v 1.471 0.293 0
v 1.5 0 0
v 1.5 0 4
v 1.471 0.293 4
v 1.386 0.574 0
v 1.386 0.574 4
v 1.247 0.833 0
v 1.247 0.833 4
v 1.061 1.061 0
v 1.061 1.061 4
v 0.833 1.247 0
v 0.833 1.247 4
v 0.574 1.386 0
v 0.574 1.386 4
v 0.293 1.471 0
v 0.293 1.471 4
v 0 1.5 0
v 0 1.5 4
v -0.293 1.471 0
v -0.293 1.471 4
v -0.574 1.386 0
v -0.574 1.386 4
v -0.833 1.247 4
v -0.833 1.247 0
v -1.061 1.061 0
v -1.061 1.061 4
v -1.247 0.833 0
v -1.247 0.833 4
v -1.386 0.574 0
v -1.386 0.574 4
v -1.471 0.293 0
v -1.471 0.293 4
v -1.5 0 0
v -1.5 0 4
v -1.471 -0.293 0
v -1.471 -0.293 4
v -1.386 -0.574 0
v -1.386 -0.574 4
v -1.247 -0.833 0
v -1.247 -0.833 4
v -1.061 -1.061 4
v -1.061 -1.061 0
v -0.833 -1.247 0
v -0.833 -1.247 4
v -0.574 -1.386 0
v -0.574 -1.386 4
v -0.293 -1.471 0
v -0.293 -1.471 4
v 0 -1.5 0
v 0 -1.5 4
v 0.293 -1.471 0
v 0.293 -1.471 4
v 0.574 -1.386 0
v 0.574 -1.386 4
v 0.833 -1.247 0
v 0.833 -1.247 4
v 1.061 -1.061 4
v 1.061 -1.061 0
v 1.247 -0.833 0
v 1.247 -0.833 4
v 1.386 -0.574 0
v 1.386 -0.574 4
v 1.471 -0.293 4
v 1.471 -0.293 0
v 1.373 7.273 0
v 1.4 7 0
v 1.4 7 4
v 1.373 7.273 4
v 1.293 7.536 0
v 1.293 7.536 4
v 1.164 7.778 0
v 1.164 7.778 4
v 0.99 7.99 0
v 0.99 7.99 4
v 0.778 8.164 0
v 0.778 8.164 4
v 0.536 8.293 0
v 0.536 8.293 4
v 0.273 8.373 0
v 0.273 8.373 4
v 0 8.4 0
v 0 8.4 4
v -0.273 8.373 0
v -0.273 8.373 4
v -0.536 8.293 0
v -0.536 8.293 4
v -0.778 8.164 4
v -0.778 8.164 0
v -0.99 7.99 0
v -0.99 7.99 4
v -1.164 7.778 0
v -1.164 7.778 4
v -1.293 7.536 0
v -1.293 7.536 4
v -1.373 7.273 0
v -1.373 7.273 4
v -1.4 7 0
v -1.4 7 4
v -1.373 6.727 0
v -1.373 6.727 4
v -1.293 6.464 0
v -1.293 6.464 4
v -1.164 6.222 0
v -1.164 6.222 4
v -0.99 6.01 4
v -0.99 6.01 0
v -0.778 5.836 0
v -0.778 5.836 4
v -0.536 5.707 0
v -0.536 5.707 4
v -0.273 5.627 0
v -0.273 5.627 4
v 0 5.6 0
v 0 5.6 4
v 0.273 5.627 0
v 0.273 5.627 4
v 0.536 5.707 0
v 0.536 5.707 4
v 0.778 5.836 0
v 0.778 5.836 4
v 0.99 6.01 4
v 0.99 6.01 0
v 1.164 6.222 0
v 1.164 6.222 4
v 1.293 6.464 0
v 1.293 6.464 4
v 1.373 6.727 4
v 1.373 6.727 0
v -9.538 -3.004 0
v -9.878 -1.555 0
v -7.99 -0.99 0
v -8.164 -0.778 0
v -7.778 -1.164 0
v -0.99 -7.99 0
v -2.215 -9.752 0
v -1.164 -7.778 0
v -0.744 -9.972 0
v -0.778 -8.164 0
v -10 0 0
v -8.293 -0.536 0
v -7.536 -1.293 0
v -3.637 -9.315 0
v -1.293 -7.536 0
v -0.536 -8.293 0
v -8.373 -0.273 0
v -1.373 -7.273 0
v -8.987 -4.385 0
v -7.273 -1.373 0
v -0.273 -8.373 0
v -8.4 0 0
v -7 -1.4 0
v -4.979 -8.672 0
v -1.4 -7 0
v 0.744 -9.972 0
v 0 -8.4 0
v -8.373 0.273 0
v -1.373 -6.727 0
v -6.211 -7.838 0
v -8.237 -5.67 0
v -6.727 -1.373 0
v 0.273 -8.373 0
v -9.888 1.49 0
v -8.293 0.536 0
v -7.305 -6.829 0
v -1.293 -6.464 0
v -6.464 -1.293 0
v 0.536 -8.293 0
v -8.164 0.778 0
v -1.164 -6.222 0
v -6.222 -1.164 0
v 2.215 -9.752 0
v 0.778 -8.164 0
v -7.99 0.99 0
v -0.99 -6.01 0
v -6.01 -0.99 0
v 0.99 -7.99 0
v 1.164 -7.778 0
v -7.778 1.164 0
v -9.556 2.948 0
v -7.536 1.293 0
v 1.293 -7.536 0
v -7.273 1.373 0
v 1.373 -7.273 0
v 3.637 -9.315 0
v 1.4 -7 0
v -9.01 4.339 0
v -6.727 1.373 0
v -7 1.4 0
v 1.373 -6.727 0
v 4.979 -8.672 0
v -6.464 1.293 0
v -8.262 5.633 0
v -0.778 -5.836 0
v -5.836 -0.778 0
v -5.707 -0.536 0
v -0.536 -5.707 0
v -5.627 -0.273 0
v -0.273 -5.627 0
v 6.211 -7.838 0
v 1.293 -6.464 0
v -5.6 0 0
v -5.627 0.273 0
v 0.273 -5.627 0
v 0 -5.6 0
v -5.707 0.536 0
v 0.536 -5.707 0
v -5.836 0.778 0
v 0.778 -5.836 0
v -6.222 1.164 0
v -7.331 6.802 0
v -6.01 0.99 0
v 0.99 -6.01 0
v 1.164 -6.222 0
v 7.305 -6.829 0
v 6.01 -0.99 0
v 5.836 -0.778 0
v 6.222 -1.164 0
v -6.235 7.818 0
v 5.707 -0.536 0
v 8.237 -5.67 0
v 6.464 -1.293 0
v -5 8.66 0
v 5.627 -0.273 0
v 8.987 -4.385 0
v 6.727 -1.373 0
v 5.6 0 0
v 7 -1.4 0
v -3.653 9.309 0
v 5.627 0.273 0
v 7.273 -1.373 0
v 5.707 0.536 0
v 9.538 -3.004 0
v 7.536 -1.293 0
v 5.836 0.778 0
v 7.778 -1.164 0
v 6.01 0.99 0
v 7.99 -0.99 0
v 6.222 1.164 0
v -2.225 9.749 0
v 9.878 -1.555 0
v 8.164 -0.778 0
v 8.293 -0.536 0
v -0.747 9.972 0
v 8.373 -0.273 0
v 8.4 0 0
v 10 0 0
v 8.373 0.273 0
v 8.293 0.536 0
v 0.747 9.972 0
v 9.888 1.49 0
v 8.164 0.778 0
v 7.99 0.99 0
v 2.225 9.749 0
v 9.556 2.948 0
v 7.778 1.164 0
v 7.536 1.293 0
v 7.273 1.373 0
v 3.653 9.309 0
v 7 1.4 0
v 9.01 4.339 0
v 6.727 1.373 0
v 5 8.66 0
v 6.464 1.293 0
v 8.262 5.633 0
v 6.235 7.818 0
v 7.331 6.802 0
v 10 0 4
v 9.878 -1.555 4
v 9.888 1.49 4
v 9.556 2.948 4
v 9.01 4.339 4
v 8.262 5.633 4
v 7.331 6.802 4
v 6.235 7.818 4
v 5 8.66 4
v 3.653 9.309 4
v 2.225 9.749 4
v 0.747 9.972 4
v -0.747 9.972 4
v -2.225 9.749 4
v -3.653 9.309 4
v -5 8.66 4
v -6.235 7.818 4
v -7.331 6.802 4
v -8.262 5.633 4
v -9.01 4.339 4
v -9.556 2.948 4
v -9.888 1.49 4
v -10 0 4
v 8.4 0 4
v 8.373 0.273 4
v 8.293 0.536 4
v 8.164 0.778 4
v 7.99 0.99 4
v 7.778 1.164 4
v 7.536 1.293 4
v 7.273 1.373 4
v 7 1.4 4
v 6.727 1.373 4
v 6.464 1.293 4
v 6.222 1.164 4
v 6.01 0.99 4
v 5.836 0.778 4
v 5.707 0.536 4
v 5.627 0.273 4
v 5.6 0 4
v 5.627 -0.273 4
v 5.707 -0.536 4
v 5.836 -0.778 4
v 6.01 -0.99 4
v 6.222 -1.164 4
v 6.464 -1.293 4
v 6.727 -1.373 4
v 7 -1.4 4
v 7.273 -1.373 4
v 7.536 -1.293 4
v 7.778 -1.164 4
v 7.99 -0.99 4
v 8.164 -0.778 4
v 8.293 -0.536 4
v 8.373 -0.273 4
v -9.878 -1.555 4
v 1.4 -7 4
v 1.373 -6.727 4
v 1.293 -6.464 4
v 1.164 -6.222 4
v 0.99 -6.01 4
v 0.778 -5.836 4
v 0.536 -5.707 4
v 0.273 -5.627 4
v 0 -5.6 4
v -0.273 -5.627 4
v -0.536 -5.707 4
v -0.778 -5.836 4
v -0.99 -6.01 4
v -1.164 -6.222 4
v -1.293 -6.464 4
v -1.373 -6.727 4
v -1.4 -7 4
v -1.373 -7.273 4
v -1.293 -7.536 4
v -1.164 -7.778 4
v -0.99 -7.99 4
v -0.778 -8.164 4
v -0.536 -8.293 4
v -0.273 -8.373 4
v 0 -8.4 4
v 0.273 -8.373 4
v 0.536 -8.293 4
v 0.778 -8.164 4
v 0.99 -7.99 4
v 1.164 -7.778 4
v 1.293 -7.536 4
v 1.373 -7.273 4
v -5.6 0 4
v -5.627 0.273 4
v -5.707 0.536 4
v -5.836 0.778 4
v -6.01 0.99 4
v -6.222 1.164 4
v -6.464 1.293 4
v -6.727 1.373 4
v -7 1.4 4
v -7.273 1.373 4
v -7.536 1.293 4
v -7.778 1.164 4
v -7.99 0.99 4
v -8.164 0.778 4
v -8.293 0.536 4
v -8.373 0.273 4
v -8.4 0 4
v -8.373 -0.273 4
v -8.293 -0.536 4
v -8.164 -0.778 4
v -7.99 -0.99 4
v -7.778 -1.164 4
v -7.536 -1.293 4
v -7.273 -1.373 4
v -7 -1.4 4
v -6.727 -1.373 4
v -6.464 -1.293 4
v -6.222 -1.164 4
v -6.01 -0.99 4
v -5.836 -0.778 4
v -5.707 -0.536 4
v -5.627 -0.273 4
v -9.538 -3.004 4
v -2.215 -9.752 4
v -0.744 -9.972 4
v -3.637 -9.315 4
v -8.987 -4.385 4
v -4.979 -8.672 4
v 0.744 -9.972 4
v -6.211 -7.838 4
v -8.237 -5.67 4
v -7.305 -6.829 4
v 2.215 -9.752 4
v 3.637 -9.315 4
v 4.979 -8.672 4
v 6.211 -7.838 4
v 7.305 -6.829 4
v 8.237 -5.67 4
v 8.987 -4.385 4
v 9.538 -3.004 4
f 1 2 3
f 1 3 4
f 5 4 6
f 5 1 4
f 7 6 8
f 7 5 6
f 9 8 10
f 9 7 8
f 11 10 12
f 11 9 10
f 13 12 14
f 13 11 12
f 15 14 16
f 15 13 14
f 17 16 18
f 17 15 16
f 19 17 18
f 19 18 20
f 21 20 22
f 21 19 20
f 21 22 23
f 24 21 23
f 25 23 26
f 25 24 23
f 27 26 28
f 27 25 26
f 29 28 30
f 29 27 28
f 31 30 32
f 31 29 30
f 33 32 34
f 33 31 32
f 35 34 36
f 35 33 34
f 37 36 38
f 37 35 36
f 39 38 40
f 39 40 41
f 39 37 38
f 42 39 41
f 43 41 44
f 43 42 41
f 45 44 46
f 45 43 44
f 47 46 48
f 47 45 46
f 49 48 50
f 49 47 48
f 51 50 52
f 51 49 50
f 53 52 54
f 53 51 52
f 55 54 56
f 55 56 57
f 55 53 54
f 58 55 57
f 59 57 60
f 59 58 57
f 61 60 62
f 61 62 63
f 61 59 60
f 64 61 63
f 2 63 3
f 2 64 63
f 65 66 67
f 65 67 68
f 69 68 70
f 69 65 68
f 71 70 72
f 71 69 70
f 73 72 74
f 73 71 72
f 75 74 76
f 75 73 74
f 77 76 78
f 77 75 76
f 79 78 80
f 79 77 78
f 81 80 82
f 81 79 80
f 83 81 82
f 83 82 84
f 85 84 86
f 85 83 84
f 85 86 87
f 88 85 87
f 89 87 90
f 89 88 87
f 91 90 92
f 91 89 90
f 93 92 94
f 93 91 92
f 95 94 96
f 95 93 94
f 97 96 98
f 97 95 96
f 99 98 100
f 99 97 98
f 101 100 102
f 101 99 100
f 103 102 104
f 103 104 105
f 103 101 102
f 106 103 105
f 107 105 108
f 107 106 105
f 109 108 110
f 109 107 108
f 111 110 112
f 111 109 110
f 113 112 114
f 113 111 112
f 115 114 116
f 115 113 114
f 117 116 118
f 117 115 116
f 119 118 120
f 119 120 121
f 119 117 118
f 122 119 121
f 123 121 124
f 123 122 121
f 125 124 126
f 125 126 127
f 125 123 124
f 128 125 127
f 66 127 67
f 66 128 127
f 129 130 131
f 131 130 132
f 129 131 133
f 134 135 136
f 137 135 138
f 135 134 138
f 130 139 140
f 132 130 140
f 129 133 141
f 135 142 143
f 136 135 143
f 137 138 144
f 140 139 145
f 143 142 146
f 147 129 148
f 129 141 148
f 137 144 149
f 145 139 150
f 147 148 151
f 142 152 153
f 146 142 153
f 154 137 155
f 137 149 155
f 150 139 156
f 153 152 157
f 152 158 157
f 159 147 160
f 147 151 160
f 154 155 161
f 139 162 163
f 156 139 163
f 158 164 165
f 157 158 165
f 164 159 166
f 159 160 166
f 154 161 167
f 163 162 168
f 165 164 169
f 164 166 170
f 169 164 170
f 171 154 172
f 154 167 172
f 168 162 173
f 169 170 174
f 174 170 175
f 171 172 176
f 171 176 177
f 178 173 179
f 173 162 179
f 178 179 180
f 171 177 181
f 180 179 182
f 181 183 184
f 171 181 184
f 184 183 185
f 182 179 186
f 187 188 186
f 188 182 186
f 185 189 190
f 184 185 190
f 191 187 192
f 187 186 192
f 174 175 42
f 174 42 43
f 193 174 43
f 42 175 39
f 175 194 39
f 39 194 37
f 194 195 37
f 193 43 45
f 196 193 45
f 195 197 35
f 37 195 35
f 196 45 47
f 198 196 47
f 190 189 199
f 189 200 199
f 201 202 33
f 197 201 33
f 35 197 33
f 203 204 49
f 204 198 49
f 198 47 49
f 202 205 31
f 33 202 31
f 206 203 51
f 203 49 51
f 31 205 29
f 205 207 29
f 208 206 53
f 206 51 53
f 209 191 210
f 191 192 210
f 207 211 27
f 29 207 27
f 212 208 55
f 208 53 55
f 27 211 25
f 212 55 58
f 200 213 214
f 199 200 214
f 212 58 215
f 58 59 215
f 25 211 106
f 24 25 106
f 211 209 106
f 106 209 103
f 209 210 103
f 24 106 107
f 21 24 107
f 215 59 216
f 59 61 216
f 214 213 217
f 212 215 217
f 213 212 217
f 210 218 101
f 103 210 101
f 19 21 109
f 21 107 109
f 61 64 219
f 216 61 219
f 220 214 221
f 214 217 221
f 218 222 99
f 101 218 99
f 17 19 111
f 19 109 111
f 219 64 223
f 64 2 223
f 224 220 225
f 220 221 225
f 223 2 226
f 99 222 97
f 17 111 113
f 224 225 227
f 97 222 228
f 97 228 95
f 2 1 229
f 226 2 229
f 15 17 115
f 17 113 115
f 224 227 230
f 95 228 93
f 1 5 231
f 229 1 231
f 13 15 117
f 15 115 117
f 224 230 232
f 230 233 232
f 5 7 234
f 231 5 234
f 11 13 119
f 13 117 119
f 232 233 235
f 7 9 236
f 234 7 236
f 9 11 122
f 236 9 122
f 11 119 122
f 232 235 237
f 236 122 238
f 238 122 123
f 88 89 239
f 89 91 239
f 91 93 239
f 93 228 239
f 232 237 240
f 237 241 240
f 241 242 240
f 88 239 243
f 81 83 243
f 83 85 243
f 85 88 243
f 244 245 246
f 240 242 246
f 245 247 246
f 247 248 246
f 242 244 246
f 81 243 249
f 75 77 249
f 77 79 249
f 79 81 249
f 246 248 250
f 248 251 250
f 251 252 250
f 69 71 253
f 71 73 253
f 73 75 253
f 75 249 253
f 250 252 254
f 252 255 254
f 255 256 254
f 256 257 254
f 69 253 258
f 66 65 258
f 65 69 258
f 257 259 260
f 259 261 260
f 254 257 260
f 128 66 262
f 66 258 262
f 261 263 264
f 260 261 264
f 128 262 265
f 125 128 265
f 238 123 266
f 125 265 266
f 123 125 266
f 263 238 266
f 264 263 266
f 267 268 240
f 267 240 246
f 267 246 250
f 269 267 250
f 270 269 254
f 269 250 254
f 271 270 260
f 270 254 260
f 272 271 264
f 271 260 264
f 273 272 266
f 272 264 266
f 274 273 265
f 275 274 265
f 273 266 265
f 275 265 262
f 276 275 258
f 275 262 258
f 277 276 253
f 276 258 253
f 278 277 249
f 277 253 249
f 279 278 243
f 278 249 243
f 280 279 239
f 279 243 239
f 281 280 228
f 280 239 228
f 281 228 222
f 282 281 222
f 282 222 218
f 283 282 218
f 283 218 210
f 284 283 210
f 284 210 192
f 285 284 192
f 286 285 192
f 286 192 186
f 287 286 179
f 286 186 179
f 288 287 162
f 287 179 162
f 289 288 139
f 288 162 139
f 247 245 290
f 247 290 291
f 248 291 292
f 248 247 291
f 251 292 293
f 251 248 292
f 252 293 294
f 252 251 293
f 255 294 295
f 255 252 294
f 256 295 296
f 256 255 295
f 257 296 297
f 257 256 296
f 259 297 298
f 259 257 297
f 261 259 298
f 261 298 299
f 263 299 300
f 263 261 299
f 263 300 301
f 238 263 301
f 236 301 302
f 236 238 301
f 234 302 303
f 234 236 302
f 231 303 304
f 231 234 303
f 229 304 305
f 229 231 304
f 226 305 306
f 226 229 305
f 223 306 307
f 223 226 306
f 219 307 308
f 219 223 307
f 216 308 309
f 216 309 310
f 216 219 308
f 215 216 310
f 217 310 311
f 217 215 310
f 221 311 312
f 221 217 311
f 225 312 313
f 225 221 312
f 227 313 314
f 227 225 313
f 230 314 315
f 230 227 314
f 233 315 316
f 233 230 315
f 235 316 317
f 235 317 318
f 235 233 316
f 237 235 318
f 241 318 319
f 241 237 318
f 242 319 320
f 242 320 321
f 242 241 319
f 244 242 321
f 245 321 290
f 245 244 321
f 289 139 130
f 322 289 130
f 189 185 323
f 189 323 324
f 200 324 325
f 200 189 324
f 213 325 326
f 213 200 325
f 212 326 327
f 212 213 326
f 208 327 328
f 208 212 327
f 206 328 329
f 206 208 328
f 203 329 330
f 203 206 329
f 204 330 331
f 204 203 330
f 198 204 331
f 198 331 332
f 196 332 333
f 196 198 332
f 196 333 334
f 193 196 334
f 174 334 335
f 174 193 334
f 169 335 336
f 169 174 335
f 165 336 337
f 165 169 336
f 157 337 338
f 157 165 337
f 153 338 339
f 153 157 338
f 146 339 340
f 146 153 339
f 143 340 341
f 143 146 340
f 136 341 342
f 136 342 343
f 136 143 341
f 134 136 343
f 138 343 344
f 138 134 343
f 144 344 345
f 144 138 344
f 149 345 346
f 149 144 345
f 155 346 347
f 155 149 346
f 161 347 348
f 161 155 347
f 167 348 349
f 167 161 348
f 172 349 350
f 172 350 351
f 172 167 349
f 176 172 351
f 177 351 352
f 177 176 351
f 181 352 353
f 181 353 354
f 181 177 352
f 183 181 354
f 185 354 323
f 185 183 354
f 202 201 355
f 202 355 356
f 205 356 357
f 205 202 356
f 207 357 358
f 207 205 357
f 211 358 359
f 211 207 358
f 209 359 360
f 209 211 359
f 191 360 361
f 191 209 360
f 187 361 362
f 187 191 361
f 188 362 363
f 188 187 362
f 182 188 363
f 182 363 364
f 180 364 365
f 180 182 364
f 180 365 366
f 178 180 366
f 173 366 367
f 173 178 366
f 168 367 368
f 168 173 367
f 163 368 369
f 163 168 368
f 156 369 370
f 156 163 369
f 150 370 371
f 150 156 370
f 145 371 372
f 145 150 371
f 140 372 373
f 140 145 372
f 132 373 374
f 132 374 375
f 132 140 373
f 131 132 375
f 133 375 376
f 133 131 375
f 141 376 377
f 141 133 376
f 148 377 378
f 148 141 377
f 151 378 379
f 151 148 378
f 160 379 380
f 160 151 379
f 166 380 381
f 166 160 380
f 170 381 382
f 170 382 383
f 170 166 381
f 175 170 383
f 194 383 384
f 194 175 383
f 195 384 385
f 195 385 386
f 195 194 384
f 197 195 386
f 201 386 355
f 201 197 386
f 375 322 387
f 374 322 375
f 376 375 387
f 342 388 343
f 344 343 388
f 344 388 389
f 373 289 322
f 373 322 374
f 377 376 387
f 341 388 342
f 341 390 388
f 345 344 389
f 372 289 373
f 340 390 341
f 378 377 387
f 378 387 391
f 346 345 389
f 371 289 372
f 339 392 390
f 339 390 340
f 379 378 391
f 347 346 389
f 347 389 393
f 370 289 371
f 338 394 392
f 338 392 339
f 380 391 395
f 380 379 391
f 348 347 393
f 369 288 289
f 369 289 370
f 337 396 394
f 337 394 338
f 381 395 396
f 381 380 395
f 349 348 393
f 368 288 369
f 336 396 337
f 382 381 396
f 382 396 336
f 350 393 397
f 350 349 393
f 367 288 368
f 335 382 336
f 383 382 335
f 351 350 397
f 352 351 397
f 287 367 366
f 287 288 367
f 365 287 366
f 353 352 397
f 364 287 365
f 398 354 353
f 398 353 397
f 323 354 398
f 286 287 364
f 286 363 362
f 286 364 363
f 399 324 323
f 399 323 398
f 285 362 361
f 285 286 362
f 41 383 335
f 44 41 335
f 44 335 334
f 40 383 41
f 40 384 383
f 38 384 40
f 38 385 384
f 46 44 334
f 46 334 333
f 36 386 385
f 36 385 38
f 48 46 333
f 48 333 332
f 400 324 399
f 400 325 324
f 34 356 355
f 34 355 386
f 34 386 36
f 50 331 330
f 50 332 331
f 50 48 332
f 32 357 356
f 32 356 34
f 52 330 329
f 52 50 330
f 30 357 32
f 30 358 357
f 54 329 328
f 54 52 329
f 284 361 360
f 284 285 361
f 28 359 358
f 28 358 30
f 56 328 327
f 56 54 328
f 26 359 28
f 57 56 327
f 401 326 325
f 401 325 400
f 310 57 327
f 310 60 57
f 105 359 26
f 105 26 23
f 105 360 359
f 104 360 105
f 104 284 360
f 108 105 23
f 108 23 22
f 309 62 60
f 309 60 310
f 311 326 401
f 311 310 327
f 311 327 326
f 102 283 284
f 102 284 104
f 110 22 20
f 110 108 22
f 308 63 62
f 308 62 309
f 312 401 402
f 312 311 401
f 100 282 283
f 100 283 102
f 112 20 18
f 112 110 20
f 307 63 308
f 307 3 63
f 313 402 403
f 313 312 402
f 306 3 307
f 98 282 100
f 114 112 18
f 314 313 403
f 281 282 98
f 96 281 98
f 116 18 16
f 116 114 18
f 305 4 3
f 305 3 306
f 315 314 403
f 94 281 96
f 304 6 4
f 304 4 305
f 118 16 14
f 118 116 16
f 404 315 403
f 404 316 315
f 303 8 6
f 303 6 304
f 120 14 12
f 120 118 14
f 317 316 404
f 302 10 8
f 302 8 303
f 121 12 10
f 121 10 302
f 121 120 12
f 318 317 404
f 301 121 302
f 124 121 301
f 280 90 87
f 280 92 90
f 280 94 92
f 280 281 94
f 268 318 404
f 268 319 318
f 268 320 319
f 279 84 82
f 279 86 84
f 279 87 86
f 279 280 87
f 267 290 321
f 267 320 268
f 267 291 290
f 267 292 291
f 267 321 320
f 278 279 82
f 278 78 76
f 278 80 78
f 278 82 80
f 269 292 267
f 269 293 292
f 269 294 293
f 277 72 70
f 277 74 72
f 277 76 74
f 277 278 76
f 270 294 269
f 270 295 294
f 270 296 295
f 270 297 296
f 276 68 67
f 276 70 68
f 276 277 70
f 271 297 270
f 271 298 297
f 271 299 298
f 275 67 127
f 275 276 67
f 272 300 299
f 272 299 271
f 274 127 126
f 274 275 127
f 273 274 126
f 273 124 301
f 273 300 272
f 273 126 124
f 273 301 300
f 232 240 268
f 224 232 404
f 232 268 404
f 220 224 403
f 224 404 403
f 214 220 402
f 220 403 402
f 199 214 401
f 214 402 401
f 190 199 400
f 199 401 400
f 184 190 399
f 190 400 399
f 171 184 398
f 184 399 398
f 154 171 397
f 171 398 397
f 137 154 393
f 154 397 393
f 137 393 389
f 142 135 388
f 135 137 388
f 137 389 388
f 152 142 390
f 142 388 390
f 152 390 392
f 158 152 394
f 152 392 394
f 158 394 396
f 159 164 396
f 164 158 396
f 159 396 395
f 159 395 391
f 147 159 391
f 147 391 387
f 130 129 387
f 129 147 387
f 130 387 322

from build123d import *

# Parameters (mm, degrees)
SKETCH1_R           = 1.5
SKETCH1_R_2         = 1.4
BOSS_EXTRUDE1_DEPTH = 4
SKETCH2_R           = 1.4
CUT_EXTRUDE1_DEPTH  = 10


with BuildPart() as part:
    # Sketch1 → Boss-Extrude1 (new body)
    with BuildSketch(Plane.XY):
        with BuildLine():
            Line((-10, 0), (-7.652901889, -30))
            ThreePointArc((-7.652901889, -30), (0, -37.652901889), (7.652901889, -30))
            Line((7.652901889, -30), (10, 0))
            ThreePointArc((10, 0), (0, 10), (-10, 0))
        make_face()
        Circle(SKETCH1_R, mode=Mode.SUBTRACT)
        with Locations((7, 0)):
            Circle(SKETCH1_R_2, mode=Mode.SUBTRACT)
        with Locations((0, -7)):
            Circle(SKETCH1_R_2, mode=Mode.SUBTRACT)
        with Locations((-7, 0)):
            Circle(SKETCH1_R_2, mode=Mode.SUBTRACT)
        with Locations((0, 7)):
            Circle(SKETCH1_R_2, mode=Mode.SUBTRACT)
        with Locations((0, -30)):
            Circle(SKETCH1_R_2, mode=Mode.SUBTRACT)
    extrude(amount=BOSS_EXTRUDE1_DEPTH)

    # Sketch2 → Cut-Extrude1 (cut)
    with BuildSketch(Plane.XY.offset(4)):
        with BuildLine():
            ThreePointArc((9.878325443, -1.55521267), (0, -10), (-9.878325443, -1.55521267))
            Line((-9.878325443, -1.55521267), (-7.652901889, -30))
            ThreePointArc((-7.652901889, -30), (0, -37.652901889), (7.652901889, -30))
            Line((7.652901889, -30), (9.878325443, -1.55521267))
        make_face()
        with Locations((0, -30)):
            Circle(SKETCH2_R, mode=Mode.SUBTRACT)
    extrude(amount=-CUT_EXTRUDE1_DEPTH, mode=Mode.SUBTRACT)


solid = part.part
